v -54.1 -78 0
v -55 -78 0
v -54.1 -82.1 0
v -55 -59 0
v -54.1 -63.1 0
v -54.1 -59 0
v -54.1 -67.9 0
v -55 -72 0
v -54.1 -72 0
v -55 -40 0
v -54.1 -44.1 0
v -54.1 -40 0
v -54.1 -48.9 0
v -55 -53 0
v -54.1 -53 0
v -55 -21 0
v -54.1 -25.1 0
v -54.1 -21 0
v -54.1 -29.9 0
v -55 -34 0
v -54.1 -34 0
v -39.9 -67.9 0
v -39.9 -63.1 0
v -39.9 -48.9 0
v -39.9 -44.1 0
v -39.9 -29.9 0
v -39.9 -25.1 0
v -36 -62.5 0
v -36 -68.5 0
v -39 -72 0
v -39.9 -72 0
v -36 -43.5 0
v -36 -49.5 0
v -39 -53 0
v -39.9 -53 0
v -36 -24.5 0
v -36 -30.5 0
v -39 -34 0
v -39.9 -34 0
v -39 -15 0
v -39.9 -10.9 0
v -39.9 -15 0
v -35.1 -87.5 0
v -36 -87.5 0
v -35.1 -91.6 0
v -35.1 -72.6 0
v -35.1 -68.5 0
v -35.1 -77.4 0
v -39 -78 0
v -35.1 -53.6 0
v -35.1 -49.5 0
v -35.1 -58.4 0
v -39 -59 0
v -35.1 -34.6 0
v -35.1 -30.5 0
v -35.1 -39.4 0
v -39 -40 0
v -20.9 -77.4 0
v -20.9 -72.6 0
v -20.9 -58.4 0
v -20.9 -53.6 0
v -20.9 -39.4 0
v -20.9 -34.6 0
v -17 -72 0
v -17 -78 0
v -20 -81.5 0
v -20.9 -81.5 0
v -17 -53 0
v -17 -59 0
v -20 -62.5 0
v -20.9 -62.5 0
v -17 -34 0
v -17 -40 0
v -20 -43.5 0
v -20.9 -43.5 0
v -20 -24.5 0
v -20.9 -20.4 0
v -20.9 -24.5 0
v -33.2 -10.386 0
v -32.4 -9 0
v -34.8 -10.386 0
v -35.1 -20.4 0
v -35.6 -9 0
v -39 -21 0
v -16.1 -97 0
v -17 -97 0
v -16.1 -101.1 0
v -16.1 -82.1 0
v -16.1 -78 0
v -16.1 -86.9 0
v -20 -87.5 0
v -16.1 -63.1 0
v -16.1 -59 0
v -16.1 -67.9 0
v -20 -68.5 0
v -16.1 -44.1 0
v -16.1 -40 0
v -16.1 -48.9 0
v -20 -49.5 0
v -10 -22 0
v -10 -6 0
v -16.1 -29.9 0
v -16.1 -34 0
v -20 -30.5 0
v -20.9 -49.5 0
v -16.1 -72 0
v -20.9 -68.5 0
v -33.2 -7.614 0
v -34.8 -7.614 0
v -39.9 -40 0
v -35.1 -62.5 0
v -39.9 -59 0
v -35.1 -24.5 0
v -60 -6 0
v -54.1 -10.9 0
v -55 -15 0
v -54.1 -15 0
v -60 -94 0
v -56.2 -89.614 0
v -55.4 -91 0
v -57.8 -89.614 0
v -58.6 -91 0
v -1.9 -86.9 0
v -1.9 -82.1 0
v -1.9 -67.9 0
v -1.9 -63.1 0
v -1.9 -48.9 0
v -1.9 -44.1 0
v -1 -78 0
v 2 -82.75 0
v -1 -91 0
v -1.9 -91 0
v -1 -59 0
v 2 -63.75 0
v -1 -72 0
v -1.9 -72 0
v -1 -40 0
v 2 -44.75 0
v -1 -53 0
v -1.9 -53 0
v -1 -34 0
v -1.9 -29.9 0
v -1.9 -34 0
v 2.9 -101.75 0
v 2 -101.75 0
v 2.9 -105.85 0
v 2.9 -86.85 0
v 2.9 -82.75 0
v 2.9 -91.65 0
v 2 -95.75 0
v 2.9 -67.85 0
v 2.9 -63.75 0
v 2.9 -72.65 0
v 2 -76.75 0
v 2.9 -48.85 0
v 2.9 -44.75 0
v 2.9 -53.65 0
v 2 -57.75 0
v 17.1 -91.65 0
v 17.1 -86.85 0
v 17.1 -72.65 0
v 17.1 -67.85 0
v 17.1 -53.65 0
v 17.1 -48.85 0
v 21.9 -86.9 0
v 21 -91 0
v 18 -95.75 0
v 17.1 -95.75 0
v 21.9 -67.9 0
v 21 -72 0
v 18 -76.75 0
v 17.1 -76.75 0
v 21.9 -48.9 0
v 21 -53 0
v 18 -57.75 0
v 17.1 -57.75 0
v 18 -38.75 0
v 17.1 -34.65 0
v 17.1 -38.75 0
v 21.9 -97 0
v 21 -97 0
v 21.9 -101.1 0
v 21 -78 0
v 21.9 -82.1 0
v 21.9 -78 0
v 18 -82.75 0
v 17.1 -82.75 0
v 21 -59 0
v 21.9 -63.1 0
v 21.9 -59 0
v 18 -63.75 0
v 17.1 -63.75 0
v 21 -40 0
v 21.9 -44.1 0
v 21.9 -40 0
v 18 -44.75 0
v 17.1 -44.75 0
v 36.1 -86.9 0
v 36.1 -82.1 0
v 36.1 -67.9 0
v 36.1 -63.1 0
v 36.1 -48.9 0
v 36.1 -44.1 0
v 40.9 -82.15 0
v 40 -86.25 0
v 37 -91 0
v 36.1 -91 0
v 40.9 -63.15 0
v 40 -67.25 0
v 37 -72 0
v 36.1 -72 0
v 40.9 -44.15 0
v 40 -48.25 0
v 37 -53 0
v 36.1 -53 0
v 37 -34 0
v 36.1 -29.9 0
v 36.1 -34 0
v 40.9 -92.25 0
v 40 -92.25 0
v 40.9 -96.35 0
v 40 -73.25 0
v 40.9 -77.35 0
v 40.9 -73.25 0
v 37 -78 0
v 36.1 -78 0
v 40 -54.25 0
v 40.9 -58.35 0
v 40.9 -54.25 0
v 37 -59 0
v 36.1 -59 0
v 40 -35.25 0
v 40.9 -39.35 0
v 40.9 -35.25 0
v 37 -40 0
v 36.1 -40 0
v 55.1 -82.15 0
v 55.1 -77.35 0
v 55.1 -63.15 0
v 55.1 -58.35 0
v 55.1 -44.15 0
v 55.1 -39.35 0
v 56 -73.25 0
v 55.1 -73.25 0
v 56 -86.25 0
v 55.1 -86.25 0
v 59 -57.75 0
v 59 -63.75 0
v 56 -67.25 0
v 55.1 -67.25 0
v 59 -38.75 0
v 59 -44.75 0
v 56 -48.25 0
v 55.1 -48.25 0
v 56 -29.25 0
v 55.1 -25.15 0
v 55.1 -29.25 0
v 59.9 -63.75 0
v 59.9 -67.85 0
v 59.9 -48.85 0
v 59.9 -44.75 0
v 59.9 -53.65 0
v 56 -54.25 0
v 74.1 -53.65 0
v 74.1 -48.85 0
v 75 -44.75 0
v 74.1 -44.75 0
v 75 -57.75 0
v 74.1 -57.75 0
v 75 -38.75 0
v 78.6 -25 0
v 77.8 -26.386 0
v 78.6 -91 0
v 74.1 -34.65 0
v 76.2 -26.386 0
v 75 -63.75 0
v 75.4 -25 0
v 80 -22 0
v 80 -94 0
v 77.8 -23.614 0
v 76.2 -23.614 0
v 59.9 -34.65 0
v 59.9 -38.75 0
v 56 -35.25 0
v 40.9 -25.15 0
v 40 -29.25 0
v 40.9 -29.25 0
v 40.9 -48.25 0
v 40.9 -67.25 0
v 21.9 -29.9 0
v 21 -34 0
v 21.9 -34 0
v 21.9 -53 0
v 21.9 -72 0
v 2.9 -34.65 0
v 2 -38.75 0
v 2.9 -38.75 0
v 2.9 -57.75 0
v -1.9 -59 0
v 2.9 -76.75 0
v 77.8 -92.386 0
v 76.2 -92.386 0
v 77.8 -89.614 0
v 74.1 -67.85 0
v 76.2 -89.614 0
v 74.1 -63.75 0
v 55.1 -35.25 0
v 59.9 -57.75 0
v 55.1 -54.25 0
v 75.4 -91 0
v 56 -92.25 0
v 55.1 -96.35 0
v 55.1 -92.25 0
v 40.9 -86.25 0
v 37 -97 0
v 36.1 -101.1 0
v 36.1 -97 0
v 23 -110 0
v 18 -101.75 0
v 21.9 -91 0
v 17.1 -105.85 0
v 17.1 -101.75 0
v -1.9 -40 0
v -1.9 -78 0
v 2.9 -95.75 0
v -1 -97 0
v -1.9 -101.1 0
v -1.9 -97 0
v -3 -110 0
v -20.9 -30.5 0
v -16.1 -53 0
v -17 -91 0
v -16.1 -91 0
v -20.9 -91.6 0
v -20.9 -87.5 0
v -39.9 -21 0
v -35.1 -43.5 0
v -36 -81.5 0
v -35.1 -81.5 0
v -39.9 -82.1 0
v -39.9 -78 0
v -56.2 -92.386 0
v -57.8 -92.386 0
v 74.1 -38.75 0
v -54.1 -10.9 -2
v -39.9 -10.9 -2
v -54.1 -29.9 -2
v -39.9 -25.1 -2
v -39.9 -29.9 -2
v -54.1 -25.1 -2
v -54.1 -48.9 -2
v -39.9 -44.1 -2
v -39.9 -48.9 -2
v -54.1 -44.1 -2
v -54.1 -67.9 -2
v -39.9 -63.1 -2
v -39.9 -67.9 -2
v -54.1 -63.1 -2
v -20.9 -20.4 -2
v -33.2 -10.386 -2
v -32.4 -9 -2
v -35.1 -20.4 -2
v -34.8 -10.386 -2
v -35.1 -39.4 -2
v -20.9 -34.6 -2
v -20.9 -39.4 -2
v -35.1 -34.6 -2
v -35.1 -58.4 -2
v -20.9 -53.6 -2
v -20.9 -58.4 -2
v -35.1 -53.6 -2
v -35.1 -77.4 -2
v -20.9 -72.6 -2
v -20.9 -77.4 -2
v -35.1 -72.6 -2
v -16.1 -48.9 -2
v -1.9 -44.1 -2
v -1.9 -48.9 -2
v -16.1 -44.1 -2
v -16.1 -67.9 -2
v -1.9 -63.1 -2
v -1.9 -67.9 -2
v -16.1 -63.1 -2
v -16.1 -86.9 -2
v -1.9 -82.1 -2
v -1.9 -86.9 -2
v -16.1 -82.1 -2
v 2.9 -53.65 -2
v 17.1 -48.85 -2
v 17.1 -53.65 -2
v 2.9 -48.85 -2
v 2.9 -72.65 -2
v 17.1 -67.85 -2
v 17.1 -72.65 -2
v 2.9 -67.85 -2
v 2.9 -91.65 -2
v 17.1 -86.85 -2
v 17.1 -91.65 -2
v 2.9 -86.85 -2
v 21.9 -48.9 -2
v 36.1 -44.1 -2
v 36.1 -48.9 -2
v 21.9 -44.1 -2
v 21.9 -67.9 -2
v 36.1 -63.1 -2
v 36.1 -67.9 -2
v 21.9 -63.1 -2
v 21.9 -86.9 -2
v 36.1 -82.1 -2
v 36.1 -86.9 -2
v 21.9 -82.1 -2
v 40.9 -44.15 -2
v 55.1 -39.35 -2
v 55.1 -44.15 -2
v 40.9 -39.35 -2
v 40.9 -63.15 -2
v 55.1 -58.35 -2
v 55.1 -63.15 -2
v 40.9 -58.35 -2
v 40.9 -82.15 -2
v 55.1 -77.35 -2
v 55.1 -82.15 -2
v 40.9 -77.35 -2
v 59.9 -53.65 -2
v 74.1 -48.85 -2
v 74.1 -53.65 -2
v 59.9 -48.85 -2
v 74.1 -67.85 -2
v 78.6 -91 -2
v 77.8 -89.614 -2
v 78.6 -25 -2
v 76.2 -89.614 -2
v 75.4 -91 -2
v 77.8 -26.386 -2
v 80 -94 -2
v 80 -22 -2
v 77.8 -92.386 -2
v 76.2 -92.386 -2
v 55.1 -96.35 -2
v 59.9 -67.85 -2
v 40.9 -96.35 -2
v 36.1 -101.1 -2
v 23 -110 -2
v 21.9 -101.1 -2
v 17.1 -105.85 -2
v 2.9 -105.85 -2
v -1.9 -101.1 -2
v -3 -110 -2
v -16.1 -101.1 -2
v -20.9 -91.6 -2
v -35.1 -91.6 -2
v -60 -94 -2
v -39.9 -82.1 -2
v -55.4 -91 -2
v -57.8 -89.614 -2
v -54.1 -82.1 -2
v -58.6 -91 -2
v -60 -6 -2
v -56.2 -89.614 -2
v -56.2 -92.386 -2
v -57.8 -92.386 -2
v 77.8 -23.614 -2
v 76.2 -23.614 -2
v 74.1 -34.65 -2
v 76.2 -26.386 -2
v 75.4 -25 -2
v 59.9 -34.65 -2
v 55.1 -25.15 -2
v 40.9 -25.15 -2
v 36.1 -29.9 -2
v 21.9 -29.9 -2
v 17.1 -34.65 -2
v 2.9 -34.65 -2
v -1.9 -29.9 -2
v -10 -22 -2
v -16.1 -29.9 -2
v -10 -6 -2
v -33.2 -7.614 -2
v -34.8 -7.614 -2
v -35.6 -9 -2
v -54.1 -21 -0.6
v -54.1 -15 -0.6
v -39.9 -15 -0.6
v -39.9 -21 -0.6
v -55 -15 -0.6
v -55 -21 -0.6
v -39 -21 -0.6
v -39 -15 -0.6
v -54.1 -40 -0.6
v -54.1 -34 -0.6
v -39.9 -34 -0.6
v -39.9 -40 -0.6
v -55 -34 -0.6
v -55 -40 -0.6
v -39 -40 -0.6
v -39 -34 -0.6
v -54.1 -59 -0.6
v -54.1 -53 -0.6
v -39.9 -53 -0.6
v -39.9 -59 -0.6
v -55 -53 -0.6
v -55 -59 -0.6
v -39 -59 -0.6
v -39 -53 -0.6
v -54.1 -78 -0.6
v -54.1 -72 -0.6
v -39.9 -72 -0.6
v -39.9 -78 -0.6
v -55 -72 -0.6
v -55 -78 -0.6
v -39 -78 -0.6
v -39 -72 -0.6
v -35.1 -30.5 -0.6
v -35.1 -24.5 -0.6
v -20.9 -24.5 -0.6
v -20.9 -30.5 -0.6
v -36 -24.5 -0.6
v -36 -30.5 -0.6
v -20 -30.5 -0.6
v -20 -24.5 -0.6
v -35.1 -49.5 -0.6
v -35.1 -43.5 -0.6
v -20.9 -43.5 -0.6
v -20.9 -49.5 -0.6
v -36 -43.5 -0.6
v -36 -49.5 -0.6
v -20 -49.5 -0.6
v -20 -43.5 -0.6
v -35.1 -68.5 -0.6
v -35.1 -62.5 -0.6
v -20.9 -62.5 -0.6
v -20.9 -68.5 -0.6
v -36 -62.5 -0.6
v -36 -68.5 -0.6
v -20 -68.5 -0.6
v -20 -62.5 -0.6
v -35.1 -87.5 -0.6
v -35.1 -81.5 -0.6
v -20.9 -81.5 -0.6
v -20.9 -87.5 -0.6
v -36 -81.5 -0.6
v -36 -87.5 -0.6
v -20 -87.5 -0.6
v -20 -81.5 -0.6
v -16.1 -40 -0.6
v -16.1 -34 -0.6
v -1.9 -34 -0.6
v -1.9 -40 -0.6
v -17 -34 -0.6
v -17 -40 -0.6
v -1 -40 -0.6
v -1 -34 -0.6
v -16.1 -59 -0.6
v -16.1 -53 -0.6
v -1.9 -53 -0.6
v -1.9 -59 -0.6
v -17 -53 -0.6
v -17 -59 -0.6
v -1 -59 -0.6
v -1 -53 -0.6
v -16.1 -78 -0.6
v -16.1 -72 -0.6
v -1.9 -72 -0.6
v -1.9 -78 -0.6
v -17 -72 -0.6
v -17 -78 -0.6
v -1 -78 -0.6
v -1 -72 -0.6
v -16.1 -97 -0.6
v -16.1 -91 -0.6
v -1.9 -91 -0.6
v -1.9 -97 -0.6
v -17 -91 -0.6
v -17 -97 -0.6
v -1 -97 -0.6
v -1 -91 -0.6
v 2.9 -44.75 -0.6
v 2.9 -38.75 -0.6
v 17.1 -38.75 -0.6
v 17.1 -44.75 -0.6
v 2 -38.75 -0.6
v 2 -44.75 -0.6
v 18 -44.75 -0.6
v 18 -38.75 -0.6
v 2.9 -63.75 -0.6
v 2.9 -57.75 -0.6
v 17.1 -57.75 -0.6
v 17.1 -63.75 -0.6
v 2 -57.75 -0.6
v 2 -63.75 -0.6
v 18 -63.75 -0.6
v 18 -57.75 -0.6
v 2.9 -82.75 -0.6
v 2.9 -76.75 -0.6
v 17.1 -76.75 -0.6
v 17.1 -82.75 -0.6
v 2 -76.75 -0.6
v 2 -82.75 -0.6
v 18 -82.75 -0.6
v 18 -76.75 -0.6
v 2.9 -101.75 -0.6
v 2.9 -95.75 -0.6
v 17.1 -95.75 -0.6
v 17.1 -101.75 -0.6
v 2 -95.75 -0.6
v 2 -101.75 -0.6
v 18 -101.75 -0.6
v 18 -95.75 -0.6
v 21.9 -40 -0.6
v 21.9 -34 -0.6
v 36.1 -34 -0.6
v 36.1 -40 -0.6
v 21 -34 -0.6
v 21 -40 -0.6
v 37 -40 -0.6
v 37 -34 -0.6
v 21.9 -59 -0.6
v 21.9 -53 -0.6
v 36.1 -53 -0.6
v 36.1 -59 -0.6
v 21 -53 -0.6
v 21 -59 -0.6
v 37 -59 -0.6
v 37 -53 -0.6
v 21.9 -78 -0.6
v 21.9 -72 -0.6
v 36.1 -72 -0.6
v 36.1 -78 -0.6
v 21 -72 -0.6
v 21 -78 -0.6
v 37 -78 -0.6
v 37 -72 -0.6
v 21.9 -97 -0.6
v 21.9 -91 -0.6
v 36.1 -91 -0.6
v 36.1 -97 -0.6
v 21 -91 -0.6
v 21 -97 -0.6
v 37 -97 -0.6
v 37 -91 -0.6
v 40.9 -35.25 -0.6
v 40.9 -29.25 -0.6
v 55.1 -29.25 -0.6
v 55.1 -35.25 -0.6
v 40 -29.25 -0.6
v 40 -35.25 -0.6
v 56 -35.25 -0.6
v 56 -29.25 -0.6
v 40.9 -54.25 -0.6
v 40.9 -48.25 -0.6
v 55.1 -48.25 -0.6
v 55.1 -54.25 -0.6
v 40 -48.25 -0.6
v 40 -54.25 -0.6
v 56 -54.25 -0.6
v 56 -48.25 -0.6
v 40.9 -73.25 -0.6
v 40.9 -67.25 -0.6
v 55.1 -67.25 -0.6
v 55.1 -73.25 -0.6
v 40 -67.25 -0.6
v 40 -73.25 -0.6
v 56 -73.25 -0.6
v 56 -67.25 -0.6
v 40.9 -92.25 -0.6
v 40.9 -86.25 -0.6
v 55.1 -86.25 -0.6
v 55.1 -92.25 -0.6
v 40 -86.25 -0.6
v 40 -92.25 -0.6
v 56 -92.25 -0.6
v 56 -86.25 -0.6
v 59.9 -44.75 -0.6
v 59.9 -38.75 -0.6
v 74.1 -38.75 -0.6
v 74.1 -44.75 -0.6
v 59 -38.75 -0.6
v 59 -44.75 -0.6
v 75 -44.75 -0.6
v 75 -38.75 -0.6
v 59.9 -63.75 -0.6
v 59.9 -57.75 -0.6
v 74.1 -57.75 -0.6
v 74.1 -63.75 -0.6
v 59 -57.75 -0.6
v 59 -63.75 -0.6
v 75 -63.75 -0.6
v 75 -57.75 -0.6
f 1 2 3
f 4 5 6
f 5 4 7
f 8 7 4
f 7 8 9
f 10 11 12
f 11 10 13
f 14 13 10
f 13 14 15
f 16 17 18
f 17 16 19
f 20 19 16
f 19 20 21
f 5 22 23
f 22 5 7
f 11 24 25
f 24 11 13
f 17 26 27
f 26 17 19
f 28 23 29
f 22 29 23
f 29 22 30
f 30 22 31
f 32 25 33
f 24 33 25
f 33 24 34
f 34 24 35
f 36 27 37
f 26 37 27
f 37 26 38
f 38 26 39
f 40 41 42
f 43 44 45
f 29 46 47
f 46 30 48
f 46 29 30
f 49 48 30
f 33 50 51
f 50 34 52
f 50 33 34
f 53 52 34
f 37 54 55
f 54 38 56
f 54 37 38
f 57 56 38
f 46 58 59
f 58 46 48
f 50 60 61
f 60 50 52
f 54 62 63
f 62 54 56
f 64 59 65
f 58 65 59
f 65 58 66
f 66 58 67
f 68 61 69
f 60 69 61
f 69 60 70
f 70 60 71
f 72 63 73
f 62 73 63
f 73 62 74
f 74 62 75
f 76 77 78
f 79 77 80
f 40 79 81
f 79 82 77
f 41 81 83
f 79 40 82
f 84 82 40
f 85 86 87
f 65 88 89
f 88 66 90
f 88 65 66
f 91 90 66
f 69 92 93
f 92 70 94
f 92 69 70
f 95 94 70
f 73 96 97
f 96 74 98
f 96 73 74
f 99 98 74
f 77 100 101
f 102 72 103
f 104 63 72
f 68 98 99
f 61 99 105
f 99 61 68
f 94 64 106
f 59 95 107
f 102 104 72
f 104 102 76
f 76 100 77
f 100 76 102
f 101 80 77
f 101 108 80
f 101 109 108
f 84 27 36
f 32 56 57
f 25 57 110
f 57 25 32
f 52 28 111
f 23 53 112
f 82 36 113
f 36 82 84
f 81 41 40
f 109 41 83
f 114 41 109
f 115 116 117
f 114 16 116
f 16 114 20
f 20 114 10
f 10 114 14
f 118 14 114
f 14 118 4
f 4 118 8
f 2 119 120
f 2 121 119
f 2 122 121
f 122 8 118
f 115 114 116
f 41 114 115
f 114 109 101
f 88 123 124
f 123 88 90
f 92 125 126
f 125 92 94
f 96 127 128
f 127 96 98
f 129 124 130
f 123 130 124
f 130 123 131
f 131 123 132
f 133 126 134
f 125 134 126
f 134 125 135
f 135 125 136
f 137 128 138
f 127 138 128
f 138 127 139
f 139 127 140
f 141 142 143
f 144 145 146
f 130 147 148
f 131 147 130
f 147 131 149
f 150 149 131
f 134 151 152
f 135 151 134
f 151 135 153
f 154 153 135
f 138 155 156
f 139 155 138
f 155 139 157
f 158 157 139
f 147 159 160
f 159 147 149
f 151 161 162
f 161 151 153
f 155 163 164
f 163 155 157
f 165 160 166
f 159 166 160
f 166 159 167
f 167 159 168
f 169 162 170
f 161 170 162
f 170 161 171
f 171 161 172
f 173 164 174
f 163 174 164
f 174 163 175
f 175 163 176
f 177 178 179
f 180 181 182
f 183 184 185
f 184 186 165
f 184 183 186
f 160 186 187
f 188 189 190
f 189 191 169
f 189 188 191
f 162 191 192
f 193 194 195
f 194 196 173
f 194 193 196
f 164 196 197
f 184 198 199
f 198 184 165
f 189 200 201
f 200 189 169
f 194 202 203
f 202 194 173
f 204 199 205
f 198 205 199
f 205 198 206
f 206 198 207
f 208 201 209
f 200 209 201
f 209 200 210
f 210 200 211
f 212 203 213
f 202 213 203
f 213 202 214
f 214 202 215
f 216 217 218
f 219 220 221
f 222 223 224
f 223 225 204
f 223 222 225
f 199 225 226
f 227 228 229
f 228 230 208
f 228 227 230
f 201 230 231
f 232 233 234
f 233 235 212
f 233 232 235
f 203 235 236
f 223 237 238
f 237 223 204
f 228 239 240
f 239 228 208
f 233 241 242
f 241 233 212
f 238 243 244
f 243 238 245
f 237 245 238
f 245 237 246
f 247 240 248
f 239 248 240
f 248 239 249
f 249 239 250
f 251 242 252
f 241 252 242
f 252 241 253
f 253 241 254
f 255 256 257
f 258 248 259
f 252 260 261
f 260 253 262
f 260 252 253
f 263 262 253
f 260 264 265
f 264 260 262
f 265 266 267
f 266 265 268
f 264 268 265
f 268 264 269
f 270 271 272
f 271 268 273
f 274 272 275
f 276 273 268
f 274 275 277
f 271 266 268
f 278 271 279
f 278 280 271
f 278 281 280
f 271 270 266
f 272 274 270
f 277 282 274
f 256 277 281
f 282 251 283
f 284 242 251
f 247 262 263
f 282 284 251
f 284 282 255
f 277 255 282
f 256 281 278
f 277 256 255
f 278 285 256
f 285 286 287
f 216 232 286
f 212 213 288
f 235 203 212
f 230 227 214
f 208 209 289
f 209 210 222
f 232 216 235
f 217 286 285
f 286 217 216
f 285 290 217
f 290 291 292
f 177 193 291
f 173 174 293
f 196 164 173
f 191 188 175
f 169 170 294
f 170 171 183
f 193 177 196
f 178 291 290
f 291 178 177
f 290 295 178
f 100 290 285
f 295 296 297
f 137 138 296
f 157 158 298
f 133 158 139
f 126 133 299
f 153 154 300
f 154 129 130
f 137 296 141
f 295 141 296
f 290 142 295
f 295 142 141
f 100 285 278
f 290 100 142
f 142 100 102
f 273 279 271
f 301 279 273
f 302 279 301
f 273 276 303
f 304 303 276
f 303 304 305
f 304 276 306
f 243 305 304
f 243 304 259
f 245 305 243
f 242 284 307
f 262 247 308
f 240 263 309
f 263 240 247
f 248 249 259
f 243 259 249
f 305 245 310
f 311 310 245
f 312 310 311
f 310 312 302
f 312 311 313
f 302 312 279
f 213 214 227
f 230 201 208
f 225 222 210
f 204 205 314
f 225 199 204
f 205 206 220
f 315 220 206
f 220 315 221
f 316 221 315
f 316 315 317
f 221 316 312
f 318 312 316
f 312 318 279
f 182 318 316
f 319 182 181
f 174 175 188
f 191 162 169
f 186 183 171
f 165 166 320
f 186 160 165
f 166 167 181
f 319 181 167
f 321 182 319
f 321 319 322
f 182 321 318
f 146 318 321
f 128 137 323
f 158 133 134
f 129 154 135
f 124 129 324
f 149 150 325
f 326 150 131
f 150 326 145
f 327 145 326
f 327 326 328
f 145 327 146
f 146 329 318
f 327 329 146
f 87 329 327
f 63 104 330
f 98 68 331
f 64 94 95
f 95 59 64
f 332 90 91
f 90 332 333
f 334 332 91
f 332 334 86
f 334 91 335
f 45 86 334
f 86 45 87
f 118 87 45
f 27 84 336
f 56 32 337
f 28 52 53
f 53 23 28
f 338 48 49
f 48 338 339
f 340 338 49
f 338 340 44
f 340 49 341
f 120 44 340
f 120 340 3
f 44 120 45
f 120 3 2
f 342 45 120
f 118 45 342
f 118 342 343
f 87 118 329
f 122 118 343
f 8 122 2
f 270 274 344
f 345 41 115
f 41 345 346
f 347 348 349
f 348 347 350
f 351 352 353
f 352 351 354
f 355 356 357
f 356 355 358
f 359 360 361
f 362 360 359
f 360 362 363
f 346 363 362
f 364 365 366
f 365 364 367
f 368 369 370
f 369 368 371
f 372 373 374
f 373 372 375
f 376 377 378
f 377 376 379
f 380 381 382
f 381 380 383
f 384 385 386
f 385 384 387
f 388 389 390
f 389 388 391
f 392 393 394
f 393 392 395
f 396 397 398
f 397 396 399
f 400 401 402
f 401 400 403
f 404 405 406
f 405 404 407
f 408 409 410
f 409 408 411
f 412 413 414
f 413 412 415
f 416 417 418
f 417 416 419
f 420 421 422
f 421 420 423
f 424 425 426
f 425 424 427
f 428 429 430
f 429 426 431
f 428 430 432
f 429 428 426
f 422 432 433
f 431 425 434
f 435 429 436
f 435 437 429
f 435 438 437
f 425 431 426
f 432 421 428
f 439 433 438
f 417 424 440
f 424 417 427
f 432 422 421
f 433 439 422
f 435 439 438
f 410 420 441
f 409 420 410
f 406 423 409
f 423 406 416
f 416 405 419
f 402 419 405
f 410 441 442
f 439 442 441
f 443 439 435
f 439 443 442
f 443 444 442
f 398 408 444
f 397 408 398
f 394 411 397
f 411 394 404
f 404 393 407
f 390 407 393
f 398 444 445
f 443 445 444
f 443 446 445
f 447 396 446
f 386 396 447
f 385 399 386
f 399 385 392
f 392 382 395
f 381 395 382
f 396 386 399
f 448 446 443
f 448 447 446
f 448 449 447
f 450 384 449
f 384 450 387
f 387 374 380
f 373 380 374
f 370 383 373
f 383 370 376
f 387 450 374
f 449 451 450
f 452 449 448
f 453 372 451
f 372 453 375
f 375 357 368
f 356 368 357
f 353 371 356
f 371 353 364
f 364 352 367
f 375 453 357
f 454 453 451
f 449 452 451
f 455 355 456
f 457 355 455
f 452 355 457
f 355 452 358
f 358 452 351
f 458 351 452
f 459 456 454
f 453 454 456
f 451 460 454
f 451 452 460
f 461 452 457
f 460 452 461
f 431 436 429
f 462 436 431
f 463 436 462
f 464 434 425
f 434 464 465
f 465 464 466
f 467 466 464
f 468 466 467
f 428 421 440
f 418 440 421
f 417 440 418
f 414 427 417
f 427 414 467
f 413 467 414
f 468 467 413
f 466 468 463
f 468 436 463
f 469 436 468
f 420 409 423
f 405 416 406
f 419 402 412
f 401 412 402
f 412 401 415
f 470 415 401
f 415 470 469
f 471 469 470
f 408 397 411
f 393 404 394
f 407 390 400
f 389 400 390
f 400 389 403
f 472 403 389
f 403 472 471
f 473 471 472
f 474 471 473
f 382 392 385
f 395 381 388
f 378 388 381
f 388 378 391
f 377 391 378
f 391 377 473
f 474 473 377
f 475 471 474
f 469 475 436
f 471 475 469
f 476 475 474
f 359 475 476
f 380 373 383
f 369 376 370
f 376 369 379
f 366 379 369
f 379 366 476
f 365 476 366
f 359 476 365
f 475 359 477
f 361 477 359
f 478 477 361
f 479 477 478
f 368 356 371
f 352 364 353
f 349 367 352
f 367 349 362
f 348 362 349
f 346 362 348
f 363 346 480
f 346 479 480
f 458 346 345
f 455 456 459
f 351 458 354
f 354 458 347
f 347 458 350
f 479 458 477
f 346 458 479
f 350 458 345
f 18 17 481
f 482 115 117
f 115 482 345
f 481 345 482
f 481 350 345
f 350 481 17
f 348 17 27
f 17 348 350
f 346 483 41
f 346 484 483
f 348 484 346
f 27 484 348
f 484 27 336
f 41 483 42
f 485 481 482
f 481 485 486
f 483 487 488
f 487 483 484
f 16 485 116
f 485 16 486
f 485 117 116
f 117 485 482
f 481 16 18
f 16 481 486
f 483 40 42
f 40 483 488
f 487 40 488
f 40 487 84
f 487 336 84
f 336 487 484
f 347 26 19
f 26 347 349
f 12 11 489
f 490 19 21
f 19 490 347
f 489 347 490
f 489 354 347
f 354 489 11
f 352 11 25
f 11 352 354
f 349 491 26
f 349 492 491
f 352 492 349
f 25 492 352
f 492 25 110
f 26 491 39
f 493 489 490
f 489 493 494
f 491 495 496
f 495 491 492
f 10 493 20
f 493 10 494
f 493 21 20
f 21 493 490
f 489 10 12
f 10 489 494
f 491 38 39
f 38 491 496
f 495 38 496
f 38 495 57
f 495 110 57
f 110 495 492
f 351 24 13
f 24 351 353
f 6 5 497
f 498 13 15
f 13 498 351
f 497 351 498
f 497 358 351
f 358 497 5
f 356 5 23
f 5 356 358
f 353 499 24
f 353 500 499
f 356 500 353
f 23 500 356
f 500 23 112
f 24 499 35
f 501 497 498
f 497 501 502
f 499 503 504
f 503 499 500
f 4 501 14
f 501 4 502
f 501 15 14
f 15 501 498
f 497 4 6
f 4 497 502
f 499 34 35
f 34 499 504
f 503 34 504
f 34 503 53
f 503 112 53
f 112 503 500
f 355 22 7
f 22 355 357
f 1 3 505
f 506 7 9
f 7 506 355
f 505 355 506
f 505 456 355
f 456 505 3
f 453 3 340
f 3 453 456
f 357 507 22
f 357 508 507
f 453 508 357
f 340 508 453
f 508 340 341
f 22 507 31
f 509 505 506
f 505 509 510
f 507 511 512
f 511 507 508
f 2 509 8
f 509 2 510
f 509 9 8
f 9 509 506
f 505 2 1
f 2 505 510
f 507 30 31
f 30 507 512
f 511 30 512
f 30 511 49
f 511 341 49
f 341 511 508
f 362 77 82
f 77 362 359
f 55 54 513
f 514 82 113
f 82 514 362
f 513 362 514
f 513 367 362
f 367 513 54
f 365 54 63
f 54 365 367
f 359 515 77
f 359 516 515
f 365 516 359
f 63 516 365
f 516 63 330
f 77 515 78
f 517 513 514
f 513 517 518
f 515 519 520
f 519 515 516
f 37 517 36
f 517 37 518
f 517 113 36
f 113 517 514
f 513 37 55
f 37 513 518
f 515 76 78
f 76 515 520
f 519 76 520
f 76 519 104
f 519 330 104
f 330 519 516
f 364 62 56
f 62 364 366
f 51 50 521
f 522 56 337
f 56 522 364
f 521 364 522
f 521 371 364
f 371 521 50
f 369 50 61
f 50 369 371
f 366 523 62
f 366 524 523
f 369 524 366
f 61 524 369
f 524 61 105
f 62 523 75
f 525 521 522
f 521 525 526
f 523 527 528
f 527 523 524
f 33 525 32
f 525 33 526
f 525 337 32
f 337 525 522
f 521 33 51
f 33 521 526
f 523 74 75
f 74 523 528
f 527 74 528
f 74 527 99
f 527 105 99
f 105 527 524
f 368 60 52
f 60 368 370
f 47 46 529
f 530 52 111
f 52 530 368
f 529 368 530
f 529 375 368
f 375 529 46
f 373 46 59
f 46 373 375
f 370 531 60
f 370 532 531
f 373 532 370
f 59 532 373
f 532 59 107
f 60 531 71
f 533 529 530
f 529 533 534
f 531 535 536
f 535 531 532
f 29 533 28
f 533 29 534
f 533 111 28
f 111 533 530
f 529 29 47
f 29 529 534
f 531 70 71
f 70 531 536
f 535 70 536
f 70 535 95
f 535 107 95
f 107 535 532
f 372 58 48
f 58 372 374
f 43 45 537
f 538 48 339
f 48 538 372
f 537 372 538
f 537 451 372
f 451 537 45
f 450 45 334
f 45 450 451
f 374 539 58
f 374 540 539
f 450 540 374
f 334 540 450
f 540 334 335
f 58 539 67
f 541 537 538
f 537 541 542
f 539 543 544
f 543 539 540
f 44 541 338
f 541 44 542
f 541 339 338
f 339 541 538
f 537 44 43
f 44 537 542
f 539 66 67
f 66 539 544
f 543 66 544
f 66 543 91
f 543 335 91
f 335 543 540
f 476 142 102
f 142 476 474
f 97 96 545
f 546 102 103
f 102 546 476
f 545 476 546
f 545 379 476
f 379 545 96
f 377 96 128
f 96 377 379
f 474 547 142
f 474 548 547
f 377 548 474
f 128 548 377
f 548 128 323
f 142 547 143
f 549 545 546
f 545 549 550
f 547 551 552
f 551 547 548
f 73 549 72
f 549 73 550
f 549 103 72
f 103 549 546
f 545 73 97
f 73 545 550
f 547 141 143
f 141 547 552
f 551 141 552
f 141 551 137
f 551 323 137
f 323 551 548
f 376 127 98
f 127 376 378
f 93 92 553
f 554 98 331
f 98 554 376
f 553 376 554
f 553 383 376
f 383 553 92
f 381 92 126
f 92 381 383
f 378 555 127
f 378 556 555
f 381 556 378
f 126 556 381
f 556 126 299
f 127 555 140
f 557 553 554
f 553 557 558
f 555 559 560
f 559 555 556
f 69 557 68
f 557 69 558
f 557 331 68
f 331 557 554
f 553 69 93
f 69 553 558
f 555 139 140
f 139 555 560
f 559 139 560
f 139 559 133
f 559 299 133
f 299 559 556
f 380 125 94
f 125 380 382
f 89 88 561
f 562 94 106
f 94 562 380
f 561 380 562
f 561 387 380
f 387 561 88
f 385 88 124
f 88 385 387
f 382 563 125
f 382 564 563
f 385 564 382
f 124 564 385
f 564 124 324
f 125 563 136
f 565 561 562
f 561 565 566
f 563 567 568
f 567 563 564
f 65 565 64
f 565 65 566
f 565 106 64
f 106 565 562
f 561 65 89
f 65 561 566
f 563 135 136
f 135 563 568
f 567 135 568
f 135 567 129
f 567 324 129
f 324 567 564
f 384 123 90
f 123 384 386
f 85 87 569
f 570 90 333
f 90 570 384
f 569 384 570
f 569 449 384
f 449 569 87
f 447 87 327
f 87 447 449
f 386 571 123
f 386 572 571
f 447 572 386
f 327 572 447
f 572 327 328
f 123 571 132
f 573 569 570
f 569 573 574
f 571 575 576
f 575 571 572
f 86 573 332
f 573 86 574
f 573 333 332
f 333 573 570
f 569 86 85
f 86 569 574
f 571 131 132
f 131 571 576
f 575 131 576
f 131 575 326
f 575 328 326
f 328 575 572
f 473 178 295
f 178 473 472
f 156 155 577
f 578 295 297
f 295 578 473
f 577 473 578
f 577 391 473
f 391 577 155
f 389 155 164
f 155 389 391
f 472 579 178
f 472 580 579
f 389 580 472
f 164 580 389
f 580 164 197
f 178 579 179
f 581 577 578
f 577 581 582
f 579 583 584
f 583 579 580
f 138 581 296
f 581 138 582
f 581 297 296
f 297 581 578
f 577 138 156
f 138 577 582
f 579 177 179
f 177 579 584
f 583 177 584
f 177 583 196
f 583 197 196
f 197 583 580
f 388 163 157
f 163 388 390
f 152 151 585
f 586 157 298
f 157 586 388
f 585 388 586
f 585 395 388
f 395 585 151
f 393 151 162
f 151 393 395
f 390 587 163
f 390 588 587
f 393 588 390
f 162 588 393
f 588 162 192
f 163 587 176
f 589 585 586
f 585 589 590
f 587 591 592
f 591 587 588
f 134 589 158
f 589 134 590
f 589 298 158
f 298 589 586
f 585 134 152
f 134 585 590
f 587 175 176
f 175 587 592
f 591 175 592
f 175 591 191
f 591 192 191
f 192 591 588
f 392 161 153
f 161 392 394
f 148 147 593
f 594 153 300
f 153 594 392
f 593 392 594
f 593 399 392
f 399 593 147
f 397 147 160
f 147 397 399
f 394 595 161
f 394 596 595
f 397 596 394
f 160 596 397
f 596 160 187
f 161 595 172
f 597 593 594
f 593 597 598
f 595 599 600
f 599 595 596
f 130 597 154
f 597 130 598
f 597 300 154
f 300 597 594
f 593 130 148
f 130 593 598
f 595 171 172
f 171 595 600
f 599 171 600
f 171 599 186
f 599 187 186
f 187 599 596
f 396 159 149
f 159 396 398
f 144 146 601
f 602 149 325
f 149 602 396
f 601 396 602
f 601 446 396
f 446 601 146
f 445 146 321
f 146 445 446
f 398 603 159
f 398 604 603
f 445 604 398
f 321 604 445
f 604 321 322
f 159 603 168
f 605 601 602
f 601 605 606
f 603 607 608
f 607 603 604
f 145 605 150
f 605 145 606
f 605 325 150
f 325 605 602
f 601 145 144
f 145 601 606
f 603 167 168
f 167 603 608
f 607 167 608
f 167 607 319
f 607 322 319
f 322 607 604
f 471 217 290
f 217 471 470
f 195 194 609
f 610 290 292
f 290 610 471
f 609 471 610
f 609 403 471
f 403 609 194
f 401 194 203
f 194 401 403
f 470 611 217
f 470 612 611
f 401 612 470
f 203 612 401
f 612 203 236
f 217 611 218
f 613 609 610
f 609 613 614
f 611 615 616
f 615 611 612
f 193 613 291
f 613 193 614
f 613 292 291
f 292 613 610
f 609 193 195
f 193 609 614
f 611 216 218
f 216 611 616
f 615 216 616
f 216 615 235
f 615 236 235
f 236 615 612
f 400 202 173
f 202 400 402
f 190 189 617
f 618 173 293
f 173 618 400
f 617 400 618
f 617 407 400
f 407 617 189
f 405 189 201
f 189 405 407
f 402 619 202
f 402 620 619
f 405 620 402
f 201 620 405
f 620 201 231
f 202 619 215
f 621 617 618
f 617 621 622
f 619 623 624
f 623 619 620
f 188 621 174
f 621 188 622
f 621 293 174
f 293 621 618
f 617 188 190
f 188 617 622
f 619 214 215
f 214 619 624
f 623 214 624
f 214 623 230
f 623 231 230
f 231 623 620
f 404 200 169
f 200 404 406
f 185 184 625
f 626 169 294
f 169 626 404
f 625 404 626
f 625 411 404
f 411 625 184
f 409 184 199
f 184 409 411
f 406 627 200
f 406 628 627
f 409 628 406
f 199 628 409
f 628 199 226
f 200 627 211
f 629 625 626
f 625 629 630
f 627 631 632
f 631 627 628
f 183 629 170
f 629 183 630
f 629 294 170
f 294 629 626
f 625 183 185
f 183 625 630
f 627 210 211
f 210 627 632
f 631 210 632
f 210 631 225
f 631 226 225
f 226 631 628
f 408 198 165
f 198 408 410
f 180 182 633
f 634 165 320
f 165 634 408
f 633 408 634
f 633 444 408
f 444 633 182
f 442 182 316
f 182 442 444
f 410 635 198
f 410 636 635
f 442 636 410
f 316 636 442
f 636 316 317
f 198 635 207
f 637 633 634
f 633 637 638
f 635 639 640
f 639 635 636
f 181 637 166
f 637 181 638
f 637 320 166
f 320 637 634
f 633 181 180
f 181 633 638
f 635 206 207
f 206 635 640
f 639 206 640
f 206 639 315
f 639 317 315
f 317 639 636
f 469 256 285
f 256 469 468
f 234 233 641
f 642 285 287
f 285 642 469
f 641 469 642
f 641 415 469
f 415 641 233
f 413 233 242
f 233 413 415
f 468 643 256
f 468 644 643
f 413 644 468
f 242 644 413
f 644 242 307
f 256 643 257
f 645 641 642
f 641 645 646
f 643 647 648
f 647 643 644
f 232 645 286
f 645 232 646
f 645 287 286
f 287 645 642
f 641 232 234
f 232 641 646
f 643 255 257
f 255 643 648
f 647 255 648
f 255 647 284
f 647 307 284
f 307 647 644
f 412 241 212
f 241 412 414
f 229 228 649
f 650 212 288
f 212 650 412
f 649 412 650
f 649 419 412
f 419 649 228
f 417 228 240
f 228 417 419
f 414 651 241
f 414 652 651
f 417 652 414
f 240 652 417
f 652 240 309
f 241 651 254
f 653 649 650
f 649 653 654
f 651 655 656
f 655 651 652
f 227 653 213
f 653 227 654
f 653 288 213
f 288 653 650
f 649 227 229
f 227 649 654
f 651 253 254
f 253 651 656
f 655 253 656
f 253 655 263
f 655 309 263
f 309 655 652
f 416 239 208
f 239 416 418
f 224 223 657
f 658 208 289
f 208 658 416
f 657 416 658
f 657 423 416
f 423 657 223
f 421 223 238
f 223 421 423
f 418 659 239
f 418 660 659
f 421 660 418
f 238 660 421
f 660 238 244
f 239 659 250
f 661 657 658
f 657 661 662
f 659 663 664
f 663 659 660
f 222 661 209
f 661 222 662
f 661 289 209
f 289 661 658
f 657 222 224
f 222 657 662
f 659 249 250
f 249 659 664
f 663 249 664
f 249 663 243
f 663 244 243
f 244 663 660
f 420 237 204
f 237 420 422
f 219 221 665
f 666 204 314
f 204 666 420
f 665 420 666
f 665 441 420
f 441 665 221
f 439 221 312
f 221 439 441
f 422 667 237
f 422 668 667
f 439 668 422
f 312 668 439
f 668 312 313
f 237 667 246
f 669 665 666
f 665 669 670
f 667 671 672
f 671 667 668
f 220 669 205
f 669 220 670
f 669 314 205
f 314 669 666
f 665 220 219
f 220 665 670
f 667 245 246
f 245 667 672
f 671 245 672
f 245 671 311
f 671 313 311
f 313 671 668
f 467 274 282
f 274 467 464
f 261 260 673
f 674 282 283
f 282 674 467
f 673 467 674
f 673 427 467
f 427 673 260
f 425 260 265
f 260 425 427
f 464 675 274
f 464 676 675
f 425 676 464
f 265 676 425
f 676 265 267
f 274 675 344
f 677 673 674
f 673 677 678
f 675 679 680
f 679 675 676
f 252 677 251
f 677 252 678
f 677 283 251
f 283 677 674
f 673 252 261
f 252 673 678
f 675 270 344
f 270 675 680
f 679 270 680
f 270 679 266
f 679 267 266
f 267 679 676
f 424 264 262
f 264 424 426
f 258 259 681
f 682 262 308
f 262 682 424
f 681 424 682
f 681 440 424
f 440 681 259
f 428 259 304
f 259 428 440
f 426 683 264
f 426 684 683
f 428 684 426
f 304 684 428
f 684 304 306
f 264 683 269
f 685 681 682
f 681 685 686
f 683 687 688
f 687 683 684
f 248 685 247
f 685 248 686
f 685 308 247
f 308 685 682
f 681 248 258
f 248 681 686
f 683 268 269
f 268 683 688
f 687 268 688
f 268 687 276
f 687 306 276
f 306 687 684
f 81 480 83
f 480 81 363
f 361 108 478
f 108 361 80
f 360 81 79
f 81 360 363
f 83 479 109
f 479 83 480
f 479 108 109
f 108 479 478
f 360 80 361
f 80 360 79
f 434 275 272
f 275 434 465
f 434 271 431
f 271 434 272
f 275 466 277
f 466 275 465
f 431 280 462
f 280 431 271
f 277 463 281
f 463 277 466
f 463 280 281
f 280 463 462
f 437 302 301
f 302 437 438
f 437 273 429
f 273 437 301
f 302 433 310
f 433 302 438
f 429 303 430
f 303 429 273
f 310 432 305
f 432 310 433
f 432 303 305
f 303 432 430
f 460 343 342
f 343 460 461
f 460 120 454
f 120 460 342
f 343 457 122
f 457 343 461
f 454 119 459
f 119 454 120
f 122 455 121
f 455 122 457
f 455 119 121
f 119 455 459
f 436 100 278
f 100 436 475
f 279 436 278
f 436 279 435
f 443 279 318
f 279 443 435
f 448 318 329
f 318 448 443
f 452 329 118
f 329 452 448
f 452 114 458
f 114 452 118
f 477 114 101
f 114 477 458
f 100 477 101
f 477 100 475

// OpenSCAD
// file: common.scad
cls = 0.20;

module keyswitch_hole(x=0, y=0, a=0) {
    translate([x, y, 0]) {
        rotate([0, 0, 90+a]) {
            linear_extrude(height = 2) {
            square([14+cls, 14+cls], center = true);
            }
            linear_extrude(height = 0.6) {
                translate([-3, 7]) square([6, 1]);
            translate([-3, -8]) square([6, 1]);
            }
        }
    }
}

keyswitch_hole();

module joint_male_face() {
    translate([-1, 0])
    square([2,4]);
    translate([-3, 2])
    square([6,2]);
}

module joint_male(pos=[0,0]) {
    translate(pos){
      rotate([0,0,180]){
        linear_extrude(height=10)
        joint_male_face();
        
        translate([0,2,10])
        rotate([-90,0,0])
        linear_extrude(height=2)
        circle(3, $fn=12);
        
        translate([0,0,10])
        rotate([-90,0,0])
        linear_extrude(height=2)
        circle(1, $fn=12);
      }
    }
}

module joint_female(pos=[0,0]) {
    delta = 0.6;
    translate(pos){
      rotate([0,0,180]){
        linear_extrude(height=10)
        offset(delta=delta)
        joint_male_face();
        
        translate([0,1.6,10])
        rotate([-90,0,0])
        linear_extrude(height=2.8)
        offset(delta=delta)
        circle(3, $fn=12);

        translate([0,-0.4,10])
        rotate([-90,0,0])
        linear_extrude(height=2.8)
        offset(delta=delta)
        circle(1, $fn=12);
      }
    }
}


joint_male([20, 0]);
joint_female([30, 0]);
// file: main.scad
use <common.scad>;

UNIT = 19;
UNIT_H = UNIT / 2;
UNIT_Q = UNIT / 4;
UNIT_E = UNIT / 8;

KEY_OFFSET_X = 10;
KEY_OFFSET_Y = 8;

finger_plate_points = [
    [-60,-4],
    [-10,-4],
    [-10,12],
    [80, 12],
    [80, 84],
    [23, 100],
    [-3, 100],
    [-60, 84],
];

finger_plate_sc_points = [
    [-34, -4+3],
    [80-3, 12+3],
    [80-3, 84 - 3],
    [-60+3, 84 - 3],
];

module finger_plate_nohole() {
    linear_extrude(height = 2)
    polygon(points=finger_plate_points);
}

module keyswitch_col(x=0,y=0,c=3,a=0) {
    rotate([0, 0, a])
    for (i = [0:c-1]) {
        keyswitch_hole(x, y+19*i);
    }
}

module finger_plate_holes() {
    // G
    GX = KEY_OFFSET_X - UNIT * 3;
    GY = KEY_OFFSET_Y;// + UNIT_Q;
    echo("G: ", GX, GY);
    keyswitch_col(GX, GY, 4);
    // F
    FX = KEY_OFFSET_X- UNIT * 2;
    FY = KEY_OFFSET_Y + UNIT_H;
    echo("F: ", FX, FY);
    keyswitch_col(FX, FY, 4);
    // E
    EX = KEY_OFFSET_X - UNIT;
    EY = KEY_OFFSET_Y + UNIT_H + UNIT_Q + UNIT_Q;
    echo("E: ", EX, EY);
    keyswitch_col(EX, EY, 4);
    // D
    DX = KEY_OFFSET_X;
    DY = KEY_OFFSET_Y + UNIT + UNIT_Q;
    echo("D: ", DX, DY);
    keyswitch_col(DX, DY, 4);
    // C
    CX = KEY_OFFSET_X+ UNIT;
    CY = KEY_OFFSET_Y + UNIT;
    echo("C: ", CX, CY);
    keyswitch_col(CX, CY, 4);
    // B
    BX = KEY_OFFSET_X+UNIT * 2;
    BY = KEY_OFFSET_Y+ UNIT_H + UNIT_Q;
    echo("B: ", BX, BY);
    keyswitch_col(BX, BY, 4);
    // A
    AX = KEY_OFFSET_X+UNIT*3;
    AY = KEY_OFFSET_Y+UNIT + UNIT_Q;
    echo("A: ", AX, AY);
    keyswitch_col(AX, AY, 2);
    //echo("A2: ", AX, AY + UNIT + UNIT_Q);
    //keyswitch_col(AX, AY + UNIT + UNIT_Q, 1);  
    for(p=finger_plate_sc_points){
        linear_extrude(height=5)
            translate(p)
            circle(1.6);
    }
}

module finger_plate() {
    difference() {
        finger_plate_nohole();
        finger_plate_holes();
    }
}

//tilt_angle = [-5,-5,0];
tilt_angle = [4,-12,0];
tilt_angle_r = tilt_angle * -1;
echo(tilt_angle_r);

//height = 15;
height = 22;

module finger_case_outer_face() {
    projection()
        translate([0,0,height])
        rotate(tilt_angle)
        linear_extrude(height=2)
        offset(2)
        polygon(points=finger_plate_points);
}

module finger_case_inner_face() {
    projection()
        translate([0,0,height])
        rotate(tilt_angle)
        linear_extrude(height=2)
        offset(-2)
        polygon(points=finger_plate_points);
}

module finger_case_bottom_face() {
    difference() {
        finger_case_outer_face();
        finger_case_inner_face();
    }
    projection()
    translate([0,0,height])
    rotate(tilt_angle)
    for(p=finger_plate_sc_points){
        linear_extrude(height=1)
        translate(p)
        circle(4);
    }
}


module finger_case_nohole() {
    difference() {
        linear_extrude(height=50)
        finger_case_bottom_face();
    
        translate([0,0,height])
        rotate(tilt_angle){
            linear_extrude(height=50)
            square(300, center=true);
            // sc hole
            translate([0,0,-9])
            linear_extrude(height=9)
            for(p=finger_plate_sc_points){
                translate(p)
                circle(1.6);
            }
            // plate_hole
            translate([0,0,-2])
            linear_extrude(height=2)
            offset(0.2)
            polygon(points=finger_plate_points);
        }
    }
}

module finger_case_hole() {
    // cable hole
    translate([25,15,0])
    rotate([90,0,0])
    linear_extrude(height=20){
        translate([0, 15])
        circle(8);
        translate([-8,15])
        square([16, 30]);
    }
    // USB hole
    translate([12,110,0])
    rotate([90,0,0])
    linear_extrude(height=20) {
        //translate([0, 10])
        //circle(9);
        translate([-9, 8])
        square([18, 40]);
    }
    // TRRS hole
    translate([72.5,95,0])
    rotate([90,0,-30])
    linear_extrude(height=20) {
        translate([0, 30])
        circle(5);
        translate([-5, 30])
        square([10, 30]);
    }
}

module finger_case() {
    difference() {
        finger_case_nohole();
        finger_case_hole();
    }
    for (x = [10, 60]) {
        joint_male([x, 10]);
    }
}

finger_case();


translate([0,-110])
finger_plate();
// main file
use <main.scad>;

translate([0,-10])
rotate([180,0,0])
finger_plate();
